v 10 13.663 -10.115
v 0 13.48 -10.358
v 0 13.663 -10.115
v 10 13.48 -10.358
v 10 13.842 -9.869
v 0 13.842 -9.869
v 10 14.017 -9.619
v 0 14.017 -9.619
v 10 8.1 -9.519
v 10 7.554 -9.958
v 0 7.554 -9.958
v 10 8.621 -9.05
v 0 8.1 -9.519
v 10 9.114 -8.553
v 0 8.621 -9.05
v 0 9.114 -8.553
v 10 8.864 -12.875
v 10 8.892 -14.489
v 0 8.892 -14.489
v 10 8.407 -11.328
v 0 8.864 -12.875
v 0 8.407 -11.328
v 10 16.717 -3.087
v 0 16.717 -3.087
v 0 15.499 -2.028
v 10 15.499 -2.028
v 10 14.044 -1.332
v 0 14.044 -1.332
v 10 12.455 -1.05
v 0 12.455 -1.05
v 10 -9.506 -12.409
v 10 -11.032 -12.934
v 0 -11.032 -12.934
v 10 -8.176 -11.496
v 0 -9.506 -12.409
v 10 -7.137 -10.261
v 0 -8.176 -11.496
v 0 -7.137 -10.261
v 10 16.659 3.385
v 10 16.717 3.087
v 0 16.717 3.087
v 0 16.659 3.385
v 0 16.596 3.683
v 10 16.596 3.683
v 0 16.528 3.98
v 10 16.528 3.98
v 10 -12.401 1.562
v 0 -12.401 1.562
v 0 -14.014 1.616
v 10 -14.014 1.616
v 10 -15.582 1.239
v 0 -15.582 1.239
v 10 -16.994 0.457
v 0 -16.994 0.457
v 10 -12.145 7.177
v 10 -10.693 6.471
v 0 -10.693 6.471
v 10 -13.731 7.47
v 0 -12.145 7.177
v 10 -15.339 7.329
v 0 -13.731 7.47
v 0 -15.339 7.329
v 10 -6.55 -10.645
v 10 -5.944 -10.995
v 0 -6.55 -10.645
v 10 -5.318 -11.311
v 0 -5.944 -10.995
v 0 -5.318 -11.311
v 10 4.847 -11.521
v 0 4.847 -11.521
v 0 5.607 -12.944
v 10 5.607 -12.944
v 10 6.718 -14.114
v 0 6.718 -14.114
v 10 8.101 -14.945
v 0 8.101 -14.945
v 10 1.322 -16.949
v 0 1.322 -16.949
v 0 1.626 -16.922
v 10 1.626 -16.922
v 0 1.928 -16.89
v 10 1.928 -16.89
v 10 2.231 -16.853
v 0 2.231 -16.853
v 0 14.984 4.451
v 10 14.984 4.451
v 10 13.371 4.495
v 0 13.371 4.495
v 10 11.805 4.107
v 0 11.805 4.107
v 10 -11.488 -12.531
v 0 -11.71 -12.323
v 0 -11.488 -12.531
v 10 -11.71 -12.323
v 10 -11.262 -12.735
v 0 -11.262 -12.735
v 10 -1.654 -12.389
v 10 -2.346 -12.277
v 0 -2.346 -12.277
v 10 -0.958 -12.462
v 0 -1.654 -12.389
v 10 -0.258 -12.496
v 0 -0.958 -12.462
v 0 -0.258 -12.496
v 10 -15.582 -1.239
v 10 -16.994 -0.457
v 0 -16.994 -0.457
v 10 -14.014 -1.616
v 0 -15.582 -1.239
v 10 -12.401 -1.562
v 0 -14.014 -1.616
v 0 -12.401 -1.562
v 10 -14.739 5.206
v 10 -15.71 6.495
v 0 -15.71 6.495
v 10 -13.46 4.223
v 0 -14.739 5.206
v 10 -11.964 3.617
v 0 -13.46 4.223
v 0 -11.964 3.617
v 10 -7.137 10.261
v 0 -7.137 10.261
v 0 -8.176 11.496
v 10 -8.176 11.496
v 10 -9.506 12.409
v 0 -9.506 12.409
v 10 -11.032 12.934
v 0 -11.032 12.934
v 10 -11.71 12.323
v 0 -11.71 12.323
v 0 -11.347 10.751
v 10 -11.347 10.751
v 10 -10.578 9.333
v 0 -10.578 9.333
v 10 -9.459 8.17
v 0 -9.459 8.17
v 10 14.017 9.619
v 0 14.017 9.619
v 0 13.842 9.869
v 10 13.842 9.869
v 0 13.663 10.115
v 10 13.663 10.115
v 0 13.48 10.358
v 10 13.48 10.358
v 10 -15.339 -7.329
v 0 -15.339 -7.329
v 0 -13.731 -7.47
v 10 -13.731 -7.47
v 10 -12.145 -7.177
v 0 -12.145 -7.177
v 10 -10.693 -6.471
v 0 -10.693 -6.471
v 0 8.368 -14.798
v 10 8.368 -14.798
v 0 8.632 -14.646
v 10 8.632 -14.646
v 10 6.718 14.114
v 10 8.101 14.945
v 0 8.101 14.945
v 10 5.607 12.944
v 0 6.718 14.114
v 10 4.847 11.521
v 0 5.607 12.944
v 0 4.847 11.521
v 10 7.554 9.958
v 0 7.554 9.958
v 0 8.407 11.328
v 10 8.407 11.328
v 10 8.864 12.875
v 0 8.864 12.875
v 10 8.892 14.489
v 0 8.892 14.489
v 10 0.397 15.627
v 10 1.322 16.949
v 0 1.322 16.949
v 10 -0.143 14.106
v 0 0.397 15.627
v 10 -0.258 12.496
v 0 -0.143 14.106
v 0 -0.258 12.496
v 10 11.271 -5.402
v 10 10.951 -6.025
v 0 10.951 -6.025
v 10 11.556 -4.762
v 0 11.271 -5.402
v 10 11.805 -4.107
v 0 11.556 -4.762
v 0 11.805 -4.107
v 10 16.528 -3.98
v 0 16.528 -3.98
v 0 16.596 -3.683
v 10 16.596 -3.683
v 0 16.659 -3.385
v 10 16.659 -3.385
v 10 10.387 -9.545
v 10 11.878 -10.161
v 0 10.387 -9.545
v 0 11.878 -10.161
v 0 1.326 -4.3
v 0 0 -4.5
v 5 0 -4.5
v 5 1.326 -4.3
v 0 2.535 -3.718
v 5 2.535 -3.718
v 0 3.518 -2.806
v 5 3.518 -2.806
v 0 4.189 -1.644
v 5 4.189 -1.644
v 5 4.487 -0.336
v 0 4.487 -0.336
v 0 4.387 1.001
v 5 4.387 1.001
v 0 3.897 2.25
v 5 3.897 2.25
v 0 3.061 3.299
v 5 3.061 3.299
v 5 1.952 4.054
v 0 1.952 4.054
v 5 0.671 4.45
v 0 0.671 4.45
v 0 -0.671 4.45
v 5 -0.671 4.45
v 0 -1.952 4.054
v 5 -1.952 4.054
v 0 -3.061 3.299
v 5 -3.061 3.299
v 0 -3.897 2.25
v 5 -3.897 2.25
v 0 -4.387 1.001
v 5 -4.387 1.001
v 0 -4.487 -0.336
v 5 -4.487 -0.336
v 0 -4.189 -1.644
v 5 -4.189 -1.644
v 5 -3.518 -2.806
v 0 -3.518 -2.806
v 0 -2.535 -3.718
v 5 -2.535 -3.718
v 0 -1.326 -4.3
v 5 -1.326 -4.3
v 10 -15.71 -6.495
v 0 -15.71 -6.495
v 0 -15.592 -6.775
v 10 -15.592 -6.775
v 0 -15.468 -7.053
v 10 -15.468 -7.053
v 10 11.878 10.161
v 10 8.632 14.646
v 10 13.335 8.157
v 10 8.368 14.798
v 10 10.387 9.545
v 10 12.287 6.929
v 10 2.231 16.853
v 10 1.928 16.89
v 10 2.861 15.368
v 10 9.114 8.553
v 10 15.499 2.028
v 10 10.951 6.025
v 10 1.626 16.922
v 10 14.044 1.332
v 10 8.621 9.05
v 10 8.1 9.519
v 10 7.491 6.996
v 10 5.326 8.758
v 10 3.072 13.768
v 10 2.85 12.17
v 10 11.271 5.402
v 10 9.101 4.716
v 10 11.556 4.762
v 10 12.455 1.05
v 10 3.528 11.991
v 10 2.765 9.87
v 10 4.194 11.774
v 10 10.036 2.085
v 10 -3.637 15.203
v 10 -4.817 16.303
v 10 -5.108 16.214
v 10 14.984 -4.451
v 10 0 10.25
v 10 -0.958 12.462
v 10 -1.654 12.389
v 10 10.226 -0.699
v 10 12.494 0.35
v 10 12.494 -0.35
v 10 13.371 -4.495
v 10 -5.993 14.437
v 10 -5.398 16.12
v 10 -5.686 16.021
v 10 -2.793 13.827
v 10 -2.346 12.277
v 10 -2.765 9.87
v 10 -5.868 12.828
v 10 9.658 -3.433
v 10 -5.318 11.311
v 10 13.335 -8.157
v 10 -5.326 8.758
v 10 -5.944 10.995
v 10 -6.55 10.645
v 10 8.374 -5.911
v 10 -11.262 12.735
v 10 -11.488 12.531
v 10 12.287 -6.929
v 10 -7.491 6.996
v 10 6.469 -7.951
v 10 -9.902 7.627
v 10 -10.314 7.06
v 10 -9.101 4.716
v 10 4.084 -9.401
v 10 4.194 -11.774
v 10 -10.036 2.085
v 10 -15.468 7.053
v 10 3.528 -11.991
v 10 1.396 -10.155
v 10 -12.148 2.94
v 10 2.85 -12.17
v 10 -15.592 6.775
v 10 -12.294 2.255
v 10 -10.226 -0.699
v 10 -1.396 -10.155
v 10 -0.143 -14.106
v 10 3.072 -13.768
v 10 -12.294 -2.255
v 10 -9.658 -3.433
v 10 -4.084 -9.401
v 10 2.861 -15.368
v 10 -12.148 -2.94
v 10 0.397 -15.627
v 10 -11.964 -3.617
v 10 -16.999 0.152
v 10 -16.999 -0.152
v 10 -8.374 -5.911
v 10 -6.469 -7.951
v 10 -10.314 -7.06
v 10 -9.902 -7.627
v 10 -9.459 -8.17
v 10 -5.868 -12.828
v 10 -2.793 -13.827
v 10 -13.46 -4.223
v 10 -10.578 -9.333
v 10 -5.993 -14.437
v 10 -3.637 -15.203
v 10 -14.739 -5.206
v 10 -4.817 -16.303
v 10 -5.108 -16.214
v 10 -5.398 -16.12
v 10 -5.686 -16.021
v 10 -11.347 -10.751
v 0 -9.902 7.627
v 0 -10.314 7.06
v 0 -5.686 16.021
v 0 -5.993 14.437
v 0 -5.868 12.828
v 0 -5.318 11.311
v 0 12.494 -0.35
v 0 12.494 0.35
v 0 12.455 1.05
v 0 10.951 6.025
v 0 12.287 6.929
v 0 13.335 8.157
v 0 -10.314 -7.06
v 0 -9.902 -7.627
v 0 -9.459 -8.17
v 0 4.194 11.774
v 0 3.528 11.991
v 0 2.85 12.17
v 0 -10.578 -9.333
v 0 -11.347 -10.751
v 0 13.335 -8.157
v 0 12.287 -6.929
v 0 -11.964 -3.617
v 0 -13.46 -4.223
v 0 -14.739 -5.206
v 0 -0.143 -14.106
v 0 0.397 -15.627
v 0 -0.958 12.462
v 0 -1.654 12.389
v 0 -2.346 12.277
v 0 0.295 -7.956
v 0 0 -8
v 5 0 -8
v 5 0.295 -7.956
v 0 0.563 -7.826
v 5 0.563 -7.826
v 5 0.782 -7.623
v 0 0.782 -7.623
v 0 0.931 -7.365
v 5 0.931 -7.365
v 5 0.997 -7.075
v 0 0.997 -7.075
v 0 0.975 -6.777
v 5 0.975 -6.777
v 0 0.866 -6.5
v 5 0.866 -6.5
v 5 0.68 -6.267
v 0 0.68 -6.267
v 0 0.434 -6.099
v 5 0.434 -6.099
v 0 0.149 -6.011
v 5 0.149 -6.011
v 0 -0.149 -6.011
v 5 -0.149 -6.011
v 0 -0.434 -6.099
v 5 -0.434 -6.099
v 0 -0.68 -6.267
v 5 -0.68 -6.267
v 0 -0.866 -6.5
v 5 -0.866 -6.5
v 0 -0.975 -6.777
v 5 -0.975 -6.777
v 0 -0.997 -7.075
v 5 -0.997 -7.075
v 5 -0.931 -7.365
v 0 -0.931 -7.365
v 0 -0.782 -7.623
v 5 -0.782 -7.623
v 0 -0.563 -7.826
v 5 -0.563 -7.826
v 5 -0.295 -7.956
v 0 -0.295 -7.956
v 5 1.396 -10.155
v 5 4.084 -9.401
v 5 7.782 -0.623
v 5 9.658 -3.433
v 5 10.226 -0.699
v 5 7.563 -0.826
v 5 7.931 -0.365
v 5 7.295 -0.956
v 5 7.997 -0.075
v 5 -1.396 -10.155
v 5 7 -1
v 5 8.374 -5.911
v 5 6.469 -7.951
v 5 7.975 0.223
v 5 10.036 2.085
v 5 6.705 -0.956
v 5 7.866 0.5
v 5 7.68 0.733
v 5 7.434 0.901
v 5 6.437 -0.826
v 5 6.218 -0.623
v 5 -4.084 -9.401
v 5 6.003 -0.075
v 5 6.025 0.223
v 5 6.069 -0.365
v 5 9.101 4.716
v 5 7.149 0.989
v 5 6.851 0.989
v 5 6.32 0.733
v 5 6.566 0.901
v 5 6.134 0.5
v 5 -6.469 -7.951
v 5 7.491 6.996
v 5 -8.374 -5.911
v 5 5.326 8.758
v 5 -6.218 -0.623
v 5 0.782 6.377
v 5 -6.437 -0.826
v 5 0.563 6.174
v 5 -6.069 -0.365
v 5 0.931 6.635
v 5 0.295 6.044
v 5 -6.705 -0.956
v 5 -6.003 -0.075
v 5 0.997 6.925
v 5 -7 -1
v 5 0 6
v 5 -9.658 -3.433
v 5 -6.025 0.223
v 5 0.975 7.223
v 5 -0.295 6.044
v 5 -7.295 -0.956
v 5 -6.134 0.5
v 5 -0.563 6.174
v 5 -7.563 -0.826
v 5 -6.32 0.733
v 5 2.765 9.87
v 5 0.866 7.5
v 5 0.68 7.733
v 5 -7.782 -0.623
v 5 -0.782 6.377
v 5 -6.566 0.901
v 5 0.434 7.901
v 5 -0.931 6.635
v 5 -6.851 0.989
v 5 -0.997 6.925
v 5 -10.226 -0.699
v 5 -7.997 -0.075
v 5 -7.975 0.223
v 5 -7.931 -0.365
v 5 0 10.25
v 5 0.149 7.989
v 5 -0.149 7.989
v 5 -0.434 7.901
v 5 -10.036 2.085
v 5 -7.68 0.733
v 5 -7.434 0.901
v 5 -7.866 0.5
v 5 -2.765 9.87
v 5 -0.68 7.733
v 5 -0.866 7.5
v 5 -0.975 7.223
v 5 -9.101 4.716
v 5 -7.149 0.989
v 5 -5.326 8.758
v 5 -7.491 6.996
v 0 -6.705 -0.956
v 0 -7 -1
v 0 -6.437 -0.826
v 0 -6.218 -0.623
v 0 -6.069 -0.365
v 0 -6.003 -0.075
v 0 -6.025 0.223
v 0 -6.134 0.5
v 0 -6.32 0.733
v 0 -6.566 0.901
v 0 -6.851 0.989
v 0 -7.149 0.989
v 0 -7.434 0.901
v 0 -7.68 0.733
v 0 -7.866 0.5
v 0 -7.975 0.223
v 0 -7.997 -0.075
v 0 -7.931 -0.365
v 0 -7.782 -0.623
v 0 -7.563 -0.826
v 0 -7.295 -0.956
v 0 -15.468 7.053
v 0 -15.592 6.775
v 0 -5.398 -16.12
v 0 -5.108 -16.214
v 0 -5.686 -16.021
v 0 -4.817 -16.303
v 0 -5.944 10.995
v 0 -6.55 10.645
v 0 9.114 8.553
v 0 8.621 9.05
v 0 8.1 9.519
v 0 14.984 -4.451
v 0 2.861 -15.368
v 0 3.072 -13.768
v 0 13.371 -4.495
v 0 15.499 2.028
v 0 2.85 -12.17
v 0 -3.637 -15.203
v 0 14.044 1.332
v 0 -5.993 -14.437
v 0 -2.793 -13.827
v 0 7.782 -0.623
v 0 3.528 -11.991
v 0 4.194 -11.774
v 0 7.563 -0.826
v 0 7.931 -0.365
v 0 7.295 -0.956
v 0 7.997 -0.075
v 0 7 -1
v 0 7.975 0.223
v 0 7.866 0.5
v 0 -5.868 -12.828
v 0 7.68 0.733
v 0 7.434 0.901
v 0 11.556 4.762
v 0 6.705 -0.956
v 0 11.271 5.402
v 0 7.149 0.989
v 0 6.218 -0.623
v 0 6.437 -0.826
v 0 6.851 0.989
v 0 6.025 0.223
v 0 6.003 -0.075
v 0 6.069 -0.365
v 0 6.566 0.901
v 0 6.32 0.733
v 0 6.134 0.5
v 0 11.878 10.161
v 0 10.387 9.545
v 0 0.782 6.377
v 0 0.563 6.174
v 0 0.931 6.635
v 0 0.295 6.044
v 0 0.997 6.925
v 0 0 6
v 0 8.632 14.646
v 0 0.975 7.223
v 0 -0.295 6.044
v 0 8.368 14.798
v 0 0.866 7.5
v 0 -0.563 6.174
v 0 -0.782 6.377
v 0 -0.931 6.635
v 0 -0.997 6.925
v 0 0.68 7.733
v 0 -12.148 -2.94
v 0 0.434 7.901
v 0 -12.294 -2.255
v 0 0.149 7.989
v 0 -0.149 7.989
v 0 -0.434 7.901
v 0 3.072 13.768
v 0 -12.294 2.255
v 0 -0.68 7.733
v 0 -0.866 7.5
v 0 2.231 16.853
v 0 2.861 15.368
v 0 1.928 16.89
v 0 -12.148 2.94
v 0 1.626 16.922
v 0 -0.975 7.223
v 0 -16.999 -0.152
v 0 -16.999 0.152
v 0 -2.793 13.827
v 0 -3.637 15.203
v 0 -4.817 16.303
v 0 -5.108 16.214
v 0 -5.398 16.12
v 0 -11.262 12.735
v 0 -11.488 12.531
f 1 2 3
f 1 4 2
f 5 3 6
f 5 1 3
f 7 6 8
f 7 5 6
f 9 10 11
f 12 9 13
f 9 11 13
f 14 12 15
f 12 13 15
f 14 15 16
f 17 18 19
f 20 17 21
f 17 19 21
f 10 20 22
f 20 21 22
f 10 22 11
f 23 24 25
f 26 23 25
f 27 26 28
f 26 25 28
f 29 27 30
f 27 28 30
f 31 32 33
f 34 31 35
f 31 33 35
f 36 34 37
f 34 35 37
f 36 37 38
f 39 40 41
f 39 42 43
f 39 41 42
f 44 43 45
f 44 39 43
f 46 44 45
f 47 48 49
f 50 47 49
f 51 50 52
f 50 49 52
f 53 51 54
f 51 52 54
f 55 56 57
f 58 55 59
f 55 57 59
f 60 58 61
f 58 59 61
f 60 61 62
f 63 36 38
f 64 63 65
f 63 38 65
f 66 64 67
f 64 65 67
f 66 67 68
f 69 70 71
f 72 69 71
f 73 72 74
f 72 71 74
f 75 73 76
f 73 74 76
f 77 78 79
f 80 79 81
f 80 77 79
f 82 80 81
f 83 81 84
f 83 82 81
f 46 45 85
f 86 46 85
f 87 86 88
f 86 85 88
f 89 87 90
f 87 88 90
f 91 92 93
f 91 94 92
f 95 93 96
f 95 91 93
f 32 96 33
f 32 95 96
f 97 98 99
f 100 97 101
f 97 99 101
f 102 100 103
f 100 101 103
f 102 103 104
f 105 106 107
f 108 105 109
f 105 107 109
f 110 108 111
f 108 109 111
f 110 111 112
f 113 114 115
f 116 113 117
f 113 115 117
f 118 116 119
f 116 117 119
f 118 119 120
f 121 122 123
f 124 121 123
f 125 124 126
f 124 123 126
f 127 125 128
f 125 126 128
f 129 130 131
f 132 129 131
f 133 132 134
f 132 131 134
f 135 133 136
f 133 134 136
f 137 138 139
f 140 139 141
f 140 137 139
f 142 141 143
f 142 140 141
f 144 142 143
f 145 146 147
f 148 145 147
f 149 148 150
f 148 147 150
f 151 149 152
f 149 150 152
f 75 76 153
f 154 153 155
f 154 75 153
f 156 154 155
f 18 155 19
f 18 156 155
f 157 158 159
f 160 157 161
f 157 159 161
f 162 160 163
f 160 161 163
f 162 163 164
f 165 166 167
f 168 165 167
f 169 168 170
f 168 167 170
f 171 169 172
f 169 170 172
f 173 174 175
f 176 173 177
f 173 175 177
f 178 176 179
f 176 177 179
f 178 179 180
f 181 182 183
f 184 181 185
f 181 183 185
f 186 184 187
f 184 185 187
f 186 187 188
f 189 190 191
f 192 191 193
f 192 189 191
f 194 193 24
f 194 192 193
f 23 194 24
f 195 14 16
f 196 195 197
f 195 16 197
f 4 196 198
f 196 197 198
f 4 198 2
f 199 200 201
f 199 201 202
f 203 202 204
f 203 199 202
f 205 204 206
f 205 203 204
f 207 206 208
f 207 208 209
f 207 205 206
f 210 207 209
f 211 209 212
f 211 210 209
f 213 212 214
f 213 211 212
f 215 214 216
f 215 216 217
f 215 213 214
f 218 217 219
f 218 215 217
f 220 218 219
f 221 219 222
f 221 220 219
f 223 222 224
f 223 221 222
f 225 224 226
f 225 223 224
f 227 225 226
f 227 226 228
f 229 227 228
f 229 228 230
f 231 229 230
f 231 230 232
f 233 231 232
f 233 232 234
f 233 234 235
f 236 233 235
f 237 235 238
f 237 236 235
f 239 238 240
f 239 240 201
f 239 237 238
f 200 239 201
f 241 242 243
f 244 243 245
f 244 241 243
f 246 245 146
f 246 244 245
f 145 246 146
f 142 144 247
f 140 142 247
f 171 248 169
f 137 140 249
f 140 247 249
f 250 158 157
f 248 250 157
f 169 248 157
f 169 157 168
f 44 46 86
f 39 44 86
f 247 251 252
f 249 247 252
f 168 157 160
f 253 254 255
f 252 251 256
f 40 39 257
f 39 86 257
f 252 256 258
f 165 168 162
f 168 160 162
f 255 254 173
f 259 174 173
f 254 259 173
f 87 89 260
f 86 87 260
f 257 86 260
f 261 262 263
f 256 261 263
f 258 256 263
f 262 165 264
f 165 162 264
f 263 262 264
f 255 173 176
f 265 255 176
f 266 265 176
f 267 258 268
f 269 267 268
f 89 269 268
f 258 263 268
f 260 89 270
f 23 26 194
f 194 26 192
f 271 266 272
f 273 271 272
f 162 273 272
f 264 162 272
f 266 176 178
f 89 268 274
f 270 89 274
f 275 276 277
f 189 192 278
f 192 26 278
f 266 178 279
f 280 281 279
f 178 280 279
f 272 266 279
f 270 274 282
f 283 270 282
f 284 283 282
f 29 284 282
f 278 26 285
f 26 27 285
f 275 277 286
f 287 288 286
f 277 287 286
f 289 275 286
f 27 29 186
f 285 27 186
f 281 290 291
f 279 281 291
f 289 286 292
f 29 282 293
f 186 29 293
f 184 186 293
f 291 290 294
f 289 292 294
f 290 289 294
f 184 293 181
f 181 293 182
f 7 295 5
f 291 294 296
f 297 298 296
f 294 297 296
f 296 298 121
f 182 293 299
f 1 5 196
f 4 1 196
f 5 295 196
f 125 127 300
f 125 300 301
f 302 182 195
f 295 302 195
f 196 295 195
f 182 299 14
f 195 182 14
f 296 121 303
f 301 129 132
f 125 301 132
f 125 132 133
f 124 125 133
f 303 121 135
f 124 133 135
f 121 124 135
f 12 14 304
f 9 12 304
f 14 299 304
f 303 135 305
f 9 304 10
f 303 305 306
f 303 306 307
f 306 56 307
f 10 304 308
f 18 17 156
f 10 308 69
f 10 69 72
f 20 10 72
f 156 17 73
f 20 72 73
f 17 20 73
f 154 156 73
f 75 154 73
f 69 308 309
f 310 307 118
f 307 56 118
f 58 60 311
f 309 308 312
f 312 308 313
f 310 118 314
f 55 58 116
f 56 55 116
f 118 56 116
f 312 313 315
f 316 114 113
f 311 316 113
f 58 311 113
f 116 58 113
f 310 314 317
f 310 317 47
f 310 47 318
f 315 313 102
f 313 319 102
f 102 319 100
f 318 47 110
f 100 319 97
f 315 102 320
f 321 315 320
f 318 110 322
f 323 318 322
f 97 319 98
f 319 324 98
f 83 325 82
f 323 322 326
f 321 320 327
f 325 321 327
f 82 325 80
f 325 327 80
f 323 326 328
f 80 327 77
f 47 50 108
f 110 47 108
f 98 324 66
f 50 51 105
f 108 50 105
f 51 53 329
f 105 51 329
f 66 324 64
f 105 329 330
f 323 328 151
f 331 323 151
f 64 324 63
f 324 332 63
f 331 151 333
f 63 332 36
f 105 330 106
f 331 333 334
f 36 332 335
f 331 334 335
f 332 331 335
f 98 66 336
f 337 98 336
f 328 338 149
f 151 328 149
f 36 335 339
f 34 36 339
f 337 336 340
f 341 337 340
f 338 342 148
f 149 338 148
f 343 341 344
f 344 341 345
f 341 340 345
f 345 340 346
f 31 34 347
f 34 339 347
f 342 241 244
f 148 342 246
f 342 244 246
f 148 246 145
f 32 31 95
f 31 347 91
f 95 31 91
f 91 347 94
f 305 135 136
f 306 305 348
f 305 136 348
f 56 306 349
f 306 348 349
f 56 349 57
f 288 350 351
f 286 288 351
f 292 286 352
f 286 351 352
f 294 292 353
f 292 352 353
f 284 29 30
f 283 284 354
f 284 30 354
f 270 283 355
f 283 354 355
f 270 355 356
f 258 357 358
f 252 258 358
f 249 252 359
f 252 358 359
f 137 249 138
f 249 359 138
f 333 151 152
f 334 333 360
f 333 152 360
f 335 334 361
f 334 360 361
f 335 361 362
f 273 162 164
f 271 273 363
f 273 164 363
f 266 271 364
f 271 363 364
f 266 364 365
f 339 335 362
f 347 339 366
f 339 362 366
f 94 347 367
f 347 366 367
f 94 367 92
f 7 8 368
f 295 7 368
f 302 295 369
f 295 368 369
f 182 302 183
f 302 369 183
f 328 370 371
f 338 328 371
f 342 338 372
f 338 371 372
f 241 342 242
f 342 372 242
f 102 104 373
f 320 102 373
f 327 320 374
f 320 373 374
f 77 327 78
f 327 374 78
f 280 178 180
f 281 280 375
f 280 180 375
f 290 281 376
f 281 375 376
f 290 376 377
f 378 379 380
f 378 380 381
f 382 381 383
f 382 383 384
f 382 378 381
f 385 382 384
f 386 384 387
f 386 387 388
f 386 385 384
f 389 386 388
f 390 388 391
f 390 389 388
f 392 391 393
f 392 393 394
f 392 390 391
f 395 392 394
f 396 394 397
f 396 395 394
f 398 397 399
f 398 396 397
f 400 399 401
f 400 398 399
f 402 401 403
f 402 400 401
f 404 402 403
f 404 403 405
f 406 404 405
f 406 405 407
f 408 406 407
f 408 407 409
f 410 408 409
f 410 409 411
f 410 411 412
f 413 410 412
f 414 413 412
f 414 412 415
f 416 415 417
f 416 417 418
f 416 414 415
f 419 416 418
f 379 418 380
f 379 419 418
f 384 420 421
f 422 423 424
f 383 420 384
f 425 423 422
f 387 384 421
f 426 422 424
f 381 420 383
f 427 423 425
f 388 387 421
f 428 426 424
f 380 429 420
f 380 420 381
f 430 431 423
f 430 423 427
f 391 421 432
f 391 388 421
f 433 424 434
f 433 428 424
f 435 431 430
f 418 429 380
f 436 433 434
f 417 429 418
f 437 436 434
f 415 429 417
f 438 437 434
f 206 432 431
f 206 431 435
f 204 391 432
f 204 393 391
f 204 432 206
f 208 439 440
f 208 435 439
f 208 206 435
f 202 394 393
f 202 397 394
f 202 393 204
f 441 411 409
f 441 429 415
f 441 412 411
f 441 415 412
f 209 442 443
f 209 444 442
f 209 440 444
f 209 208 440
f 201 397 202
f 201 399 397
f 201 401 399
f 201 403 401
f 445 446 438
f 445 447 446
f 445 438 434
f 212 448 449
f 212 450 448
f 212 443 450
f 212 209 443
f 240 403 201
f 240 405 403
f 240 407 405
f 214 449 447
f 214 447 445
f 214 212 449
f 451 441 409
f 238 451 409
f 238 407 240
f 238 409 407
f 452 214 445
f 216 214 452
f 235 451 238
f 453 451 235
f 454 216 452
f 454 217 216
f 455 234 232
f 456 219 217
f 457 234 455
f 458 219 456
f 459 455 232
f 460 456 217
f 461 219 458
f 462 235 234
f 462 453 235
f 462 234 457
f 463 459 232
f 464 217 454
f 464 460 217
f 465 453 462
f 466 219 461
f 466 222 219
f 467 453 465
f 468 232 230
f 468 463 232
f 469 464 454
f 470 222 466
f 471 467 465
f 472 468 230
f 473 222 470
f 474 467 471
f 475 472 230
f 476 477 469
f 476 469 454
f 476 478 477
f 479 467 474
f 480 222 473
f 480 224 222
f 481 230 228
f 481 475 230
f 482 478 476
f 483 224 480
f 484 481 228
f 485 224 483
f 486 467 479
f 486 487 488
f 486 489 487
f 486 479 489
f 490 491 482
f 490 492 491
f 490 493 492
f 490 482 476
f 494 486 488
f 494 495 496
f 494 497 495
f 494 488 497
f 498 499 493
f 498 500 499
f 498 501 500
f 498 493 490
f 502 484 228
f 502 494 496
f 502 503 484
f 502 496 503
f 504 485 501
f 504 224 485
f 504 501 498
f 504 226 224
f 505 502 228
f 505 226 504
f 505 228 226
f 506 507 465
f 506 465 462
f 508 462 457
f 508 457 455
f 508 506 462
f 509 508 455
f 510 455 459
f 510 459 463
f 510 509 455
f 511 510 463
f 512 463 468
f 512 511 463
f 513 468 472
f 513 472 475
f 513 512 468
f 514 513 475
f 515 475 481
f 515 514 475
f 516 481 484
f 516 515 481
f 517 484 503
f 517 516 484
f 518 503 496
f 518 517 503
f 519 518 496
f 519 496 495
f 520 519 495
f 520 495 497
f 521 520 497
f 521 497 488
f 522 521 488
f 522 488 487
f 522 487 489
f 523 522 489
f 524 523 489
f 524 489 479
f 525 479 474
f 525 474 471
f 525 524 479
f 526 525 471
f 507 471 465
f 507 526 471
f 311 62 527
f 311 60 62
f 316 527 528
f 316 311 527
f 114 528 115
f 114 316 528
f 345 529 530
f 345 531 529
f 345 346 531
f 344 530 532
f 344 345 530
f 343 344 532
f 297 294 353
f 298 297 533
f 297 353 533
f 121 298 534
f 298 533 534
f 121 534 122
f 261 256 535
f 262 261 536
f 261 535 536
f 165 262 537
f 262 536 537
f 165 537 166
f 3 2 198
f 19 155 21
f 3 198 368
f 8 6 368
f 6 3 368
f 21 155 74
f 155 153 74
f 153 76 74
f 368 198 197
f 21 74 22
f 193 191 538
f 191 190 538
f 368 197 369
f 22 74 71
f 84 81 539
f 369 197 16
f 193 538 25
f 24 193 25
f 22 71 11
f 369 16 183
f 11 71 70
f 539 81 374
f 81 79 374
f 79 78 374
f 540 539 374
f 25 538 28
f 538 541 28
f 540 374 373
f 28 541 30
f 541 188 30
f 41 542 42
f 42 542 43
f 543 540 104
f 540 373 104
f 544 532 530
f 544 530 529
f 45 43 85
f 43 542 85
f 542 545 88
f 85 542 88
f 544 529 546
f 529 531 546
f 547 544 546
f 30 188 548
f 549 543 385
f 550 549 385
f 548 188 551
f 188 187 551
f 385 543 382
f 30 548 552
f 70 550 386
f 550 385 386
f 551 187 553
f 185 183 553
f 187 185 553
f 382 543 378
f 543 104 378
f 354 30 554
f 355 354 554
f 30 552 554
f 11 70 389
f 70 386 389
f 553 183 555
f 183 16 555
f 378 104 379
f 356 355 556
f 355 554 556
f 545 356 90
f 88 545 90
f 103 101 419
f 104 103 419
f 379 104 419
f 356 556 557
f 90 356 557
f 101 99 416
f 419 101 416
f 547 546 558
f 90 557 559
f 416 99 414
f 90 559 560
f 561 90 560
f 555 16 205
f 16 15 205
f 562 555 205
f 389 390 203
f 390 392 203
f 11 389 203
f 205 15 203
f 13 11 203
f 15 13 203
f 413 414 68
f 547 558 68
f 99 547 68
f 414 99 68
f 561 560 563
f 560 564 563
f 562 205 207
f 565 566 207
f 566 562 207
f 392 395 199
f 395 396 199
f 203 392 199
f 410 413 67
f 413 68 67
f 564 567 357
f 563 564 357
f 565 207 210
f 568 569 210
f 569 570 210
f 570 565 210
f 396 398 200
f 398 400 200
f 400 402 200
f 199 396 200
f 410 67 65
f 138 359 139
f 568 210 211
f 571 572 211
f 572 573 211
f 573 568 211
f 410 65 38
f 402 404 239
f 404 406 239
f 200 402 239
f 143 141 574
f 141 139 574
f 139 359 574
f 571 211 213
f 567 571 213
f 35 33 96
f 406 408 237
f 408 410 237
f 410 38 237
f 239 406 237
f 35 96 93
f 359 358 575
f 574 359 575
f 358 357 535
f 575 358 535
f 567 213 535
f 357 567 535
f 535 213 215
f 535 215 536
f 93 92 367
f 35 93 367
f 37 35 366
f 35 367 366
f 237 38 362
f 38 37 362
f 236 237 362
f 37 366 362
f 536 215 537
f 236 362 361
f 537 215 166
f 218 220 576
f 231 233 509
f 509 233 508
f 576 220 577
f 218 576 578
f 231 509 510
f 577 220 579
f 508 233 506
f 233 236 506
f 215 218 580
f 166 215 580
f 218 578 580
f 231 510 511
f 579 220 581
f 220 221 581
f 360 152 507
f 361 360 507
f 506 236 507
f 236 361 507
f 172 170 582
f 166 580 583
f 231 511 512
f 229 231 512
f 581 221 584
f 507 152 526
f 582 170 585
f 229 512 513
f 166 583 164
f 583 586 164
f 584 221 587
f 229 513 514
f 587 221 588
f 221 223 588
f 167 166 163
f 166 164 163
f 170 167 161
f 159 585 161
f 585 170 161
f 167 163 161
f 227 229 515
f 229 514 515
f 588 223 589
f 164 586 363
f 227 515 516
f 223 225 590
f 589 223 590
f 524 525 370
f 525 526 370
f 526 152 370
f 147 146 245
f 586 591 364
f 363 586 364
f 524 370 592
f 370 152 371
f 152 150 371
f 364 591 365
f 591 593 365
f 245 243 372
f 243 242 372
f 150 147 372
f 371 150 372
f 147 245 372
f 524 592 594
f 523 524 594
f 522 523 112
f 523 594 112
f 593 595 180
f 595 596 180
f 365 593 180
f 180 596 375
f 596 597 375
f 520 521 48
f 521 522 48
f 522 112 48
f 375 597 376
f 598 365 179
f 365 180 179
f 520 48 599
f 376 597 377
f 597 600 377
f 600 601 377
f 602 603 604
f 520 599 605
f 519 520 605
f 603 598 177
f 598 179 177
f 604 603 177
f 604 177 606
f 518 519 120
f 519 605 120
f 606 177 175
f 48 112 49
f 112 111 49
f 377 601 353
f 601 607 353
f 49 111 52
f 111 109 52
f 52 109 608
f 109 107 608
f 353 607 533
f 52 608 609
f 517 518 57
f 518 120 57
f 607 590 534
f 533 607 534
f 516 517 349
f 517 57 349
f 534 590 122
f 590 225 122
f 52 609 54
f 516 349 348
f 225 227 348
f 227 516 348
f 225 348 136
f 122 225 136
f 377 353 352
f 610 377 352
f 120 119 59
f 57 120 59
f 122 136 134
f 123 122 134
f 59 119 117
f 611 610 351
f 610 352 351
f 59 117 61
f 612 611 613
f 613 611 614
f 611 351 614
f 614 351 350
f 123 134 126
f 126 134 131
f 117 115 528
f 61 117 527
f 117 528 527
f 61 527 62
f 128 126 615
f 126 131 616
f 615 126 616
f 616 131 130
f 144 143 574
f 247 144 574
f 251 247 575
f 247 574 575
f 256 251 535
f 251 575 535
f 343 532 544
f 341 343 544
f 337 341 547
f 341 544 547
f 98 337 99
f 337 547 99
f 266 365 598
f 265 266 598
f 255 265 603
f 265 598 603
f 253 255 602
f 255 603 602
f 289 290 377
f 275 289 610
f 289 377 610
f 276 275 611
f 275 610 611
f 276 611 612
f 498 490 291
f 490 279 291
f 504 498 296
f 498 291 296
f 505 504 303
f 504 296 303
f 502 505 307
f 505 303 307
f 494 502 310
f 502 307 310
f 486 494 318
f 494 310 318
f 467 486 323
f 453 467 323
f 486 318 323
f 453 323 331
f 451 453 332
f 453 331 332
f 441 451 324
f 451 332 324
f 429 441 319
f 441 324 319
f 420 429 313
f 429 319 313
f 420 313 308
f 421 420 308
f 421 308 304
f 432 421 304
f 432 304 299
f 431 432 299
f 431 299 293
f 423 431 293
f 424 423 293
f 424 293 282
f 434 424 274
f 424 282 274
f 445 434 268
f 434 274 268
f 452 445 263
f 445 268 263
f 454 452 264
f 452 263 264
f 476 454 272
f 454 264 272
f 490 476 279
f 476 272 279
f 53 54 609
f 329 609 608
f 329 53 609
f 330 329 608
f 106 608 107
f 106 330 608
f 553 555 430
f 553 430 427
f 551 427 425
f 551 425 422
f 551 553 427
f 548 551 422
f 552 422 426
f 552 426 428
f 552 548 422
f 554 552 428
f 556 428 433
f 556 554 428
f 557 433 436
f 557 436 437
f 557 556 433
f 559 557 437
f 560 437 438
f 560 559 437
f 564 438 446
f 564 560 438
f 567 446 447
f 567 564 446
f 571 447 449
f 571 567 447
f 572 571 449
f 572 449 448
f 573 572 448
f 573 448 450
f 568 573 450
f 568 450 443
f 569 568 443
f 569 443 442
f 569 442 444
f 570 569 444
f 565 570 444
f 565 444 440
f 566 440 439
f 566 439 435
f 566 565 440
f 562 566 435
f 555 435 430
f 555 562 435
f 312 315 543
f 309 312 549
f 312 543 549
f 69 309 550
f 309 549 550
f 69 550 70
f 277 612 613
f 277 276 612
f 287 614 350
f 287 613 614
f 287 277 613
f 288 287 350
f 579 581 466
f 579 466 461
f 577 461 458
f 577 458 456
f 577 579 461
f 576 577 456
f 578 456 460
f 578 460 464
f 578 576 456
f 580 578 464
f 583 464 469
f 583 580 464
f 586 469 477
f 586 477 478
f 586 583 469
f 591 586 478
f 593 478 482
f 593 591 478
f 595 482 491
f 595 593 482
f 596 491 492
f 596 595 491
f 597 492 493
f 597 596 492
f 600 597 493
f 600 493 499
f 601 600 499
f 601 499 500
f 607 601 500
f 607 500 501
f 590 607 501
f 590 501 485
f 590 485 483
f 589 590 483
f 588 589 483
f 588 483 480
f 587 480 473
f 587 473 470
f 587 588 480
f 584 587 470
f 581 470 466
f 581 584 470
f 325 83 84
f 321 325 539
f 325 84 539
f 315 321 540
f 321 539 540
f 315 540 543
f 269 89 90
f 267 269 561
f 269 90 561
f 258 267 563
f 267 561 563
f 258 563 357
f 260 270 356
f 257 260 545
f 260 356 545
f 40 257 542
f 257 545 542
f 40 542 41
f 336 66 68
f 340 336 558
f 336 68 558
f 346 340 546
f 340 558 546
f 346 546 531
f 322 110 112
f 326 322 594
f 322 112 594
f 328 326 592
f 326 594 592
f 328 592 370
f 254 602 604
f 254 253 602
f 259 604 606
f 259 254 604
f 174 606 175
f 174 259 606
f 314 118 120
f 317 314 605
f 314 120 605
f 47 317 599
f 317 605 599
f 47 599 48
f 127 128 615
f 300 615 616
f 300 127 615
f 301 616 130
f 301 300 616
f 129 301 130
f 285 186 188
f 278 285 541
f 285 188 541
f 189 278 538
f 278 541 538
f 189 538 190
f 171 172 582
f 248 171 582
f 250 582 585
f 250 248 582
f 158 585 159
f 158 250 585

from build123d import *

# Parameters (mm, degrees)
BASPROSKE_W         = 10
BASPROSKE_H         = 17
TOOTHCUT_DEPTH      = 27.038433133
TEETHCUTS_COUNT     = 15
BORSKE_R            = 10.25
BORE_DEPTH          = 10
SKETCH1_R           = 10.25
SKETCH1_R_2         = 1
SKETCH1_R_3         = 4.5
BOSS_EXTRUDE1_DEPTH = 5


with BuildPart() as part:
    # BasProSke → Base-Revolve (revolve)
    with BuildSketch(Plane(origin=(0, 0, 0), x_dir=(1, 0, 0), z_dir=(0, 1, 0)), mode=Mode.PRIVATE) as base_revolve_sk:
        with Locations((5, 8.5)):
            Rectangle(BASPROSKE_W, BASPROSKE_H)
    revolve(base_revolve_sk.sketch.rotate(Axis((-10, 0, 0), (1, 0, 0)), 180), axis=Axis((-10, 0, 0), (1, 0, 0)))

    # TooCutSke → ToothCut (cut, through all)
    with BuildSketch(Plane(origin=(0, 0, 0), x_dir=(0, 0, -1), z_dir=(1, 0, 0))):
        with BuildLine():
            ThreePointArc((1.050056448, 12.454813626), (0, 12.499), (-1.050056448, 12.454813626))
            ThreePointArc((-1.050056448, 12.454813626), (-1.638118106, 14.809604533), (-3.110934279, 16.73876737))
            ThreePointArc((-3.110934279, 16.73876737), (0, 17.0254), (3.110934279, 16.73876737))
            ThreePointArc((3.110934279, 16.73876737), (1.638118106, 14.809604533), (1.050056448, 12.454813626))
        make_face()
    toothcut = extrude(amount=TOOTHCUT_DEPTH, mode=Mode.SUBTRACT)

    # TeethCuts: ToothCut ×15 about axis
    teethcuts_axis = Axis((0, 0, 0), (1, 0, 0))
    for i in range(1, TEETHCUTS_COUNT):
        add(toothcut.rotate(teethcuts_axis, i * 360 / TEETHCUTS_COUNT), mode=Mode.SUBTRACT)

    # BorSke → Bore (cut, symmetric)
    with BuildSketch(Plane(origin=(0, 0, 0), x_dir=(0, 0, -1), z_dir=(1, 0, 0))):
        with Locations(Location((0, 0, 0), (0, 0, 180))):
            Circle(BORSKE_R)
    extrude(amount=BORE_DEPTH, both=True, mode=Mode.SUBTRACT)

    # Sketch1 → Boss-Extrude1 (add)
    with BuildSketch(Plane(origin=(0, 0, 0), x_dir=(0, 0, -1), z_dir=(1, 0, 0))):
        with Locations(Location((0, 0, 0), (0, 0, 180))):
            Circle(SKETCH1_R)
        with Locations((7, 0)):
            Circle(SKETCH1_R_2, mode=Mode.SUBTRACT)
        with Locations((-7, 0)):
            Circle(SKETCH1_R_2, mode=Mode.SUBTRACT)
        with Locations((0, 7)):
            Circle(SKETCH1_R_2, mode=Mode.SUBTRACT)
        with Locations((0, -7)):
            Circle(SKETCH1_R_2, mode=Mode.SUBTRACT)
        Circle(SKETCH1_R_3, mode=Mode.SUBTRACT)
    extrude(amount=BOSS_EXTRUDE1_DEPTH)


solid = part.part
